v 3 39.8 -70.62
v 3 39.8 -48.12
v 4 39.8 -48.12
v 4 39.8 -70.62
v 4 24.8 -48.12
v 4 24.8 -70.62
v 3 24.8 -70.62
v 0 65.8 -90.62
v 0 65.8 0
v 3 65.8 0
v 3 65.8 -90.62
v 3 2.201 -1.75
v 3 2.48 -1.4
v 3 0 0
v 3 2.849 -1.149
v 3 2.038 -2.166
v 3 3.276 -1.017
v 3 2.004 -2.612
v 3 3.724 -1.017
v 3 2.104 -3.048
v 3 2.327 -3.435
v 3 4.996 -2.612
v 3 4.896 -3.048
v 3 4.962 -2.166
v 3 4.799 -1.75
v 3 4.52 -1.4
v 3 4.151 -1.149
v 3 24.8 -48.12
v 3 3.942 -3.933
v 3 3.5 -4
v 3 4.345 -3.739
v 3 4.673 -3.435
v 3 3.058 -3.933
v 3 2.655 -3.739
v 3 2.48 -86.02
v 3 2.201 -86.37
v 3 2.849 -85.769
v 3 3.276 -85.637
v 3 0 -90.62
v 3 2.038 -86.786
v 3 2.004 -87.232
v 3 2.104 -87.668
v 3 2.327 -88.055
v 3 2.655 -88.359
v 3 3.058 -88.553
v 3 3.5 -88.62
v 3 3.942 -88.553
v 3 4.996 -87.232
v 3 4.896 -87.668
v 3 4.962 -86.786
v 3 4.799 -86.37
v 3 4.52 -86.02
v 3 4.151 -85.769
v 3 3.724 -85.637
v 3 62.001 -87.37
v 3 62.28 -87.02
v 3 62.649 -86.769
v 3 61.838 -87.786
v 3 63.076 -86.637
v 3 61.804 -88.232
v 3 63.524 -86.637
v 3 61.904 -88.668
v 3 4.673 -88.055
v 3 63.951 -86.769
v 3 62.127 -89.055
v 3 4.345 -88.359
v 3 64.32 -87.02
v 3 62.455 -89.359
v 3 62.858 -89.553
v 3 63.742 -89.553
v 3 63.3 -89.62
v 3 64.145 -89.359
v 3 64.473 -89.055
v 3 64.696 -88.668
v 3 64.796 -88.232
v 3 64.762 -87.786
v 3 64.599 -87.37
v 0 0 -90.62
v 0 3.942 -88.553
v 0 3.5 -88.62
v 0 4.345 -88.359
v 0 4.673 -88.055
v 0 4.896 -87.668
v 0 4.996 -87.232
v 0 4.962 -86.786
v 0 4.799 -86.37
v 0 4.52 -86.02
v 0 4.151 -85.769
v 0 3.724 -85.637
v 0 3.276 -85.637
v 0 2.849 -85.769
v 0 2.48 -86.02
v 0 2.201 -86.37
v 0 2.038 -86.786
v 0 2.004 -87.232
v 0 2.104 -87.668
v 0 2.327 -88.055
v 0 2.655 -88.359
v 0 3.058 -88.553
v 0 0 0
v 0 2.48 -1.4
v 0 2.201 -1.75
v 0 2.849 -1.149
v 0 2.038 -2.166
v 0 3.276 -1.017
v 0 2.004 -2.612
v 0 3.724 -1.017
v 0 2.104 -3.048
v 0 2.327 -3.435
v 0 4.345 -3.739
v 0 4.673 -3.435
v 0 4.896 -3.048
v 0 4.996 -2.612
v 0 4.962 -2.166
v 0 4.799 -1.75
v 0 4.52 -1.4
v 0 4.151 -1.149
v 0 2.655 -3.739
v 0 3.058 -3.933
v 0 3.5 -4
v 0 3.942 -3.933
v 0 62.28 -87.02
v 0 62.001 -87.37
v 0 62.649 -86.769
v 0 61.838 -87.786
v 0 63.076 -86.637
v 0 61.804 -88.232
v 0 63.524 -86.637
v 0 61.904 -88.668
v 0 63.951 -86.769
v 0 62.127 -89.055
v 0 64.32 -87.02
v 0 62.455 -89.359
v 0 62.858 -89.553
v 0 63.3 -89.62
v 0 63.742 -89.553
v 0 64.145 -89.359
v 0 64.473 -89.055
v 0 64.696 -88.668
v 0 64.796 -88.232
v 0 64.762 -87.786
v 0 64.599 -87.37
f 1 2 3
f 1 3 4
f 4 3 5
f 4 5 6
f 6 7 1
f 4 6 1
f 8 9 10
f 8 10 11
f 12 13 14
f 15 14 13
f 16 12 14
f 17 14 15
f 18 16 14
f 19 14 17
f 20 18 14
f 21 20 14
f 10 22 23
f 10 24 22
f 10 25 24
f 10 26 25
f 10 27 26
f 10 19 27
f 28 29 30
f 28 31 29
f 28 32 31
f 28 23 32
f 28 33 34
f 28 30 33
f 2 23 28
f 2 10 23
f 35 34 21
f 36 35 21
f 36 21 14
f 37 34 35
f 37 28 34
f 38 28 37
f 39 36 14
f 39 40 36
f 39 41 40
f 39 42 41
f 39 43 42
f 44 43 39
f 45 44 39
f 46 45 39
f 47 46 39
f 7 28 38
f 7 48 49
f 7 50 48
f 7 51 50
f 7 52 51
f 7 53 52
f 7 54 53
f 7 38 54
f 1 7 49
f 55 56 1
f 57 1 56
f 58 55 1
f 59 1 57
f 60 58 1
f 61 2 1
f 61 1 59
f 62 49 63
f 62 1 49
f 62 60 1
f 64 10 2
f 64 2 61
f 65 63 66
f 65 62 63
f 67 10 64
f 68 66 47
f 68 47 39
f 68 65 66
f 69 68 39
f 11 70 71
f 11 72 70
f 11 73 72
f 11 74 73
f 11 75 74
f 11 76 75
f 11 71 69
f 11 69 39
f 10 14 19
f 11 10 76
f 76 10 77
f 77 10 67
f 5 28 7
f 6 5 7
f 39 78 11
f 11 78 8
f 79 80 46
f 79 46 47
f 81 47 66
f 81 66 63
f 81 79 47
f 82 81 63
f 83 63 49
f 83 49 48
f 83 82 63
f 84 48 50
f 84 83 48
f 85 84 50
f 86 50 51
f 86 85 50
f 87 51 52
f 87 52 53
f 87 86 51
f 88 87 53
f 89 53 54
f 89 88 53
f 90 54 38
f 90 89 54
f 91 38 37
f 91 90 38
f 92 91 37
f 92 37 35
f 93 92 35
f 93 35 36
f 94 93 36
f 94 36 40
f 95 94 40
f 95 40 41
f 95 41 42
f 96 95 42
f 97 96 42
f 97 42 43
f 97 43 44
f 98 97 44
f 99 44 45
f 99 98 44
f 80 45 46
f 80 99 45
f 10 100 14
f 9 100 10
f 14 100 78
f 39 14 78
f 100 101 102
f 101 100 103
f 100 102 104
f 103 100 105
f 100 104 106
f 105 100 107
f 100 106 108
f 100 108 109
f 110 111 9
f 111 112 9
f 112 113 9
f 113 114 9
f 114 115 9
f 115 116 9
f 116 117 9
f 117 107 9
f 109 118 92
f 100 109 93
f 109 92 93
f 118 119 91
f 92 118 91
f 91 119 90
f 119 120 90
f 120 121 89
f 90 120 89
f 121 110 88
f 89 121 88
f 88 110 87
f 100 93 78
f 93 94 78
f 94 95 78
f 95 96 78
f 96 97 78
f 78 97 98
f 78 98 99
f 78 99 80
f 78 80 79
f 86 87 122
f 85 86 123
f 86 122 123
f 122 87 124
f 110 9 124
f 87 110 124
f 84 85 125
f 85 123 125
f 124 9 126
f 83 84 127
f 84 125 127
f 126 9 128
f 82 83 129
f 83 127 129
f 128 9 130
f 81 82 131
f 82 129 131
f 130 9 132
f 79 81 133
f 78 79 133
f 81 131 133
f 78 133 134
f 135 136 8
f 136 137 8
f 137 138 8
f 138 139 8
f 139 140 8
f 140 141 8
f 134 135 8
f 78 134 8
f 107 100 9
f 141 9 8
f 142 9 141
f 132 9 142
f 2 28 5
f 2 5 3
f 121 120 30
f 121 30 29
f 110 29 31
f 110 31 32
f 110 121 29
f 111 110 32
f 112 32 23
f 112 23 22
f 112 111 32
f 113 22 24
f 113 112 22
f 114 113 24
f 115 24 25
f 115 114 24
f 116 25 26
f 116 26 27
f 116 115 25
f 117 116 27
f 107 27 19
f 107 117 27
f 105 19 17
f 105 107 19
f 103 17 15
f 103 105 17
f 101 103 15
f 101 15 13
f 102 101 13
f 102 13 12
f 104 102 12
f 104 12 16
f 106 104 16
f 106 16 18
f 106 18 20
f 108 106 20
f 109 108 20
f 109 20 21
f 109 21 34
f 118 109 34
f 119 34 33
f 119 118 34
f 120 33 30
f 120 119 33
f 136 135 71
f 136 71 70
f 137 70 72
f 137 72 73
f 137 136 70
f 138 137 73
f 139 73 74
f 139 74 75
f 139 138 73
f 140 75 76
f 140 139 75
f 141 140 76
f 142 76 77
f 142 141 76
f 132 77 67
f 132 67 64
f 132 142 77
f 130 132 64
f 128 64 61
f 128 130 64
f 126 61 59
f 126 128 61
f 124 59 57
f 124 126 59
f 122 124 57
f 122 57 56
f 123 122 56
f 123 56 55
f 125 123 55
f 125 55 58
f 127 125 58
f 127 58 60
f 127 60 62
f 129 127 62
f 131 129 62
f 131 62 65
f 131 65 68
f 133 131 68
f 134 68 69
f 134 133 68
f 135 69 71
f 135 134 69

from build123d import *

# Parameters (mm, degrees)
CROQUIS1_W              = 90.62
CROQUIS1_H              = 65.8
CROQUIS1_R              = 1.5
SALIENTE_EXTRUIR1_DEPTH = 3
CROQUIS2_W              = 22.5
CROQUIS2_H              = 15
SALIENTE_EXTRUIR2_DEPTH = 1


with BuildPart() as part:
    # Croquis1 → Saliente-Extruir1 (new body)
    with BuildSketch(Plane(origin=(0, 0, 0), x_dir=(0, 0, -1), z_dir=(1, 0, 0))):
        with Locations((45.31, 32.9)):
            Rectangle(CROQUIS1_W, CROQUIS1_H)
        with Locations((88.12, 63.3)):
            Circle(CROQUIS1_R, mode=Mode.SUBTRACT)
        with Locations((87.12, 3.5)):
            Circle(CROQUIS1_R, mode=Mode.SUBTRACT)
        with Locations((2.5, 3.5)):
            Circle(CROQUIS1_R, mode=Mode.SUBTRACT)
    extrude(amount=SALIENTE_EXTRUIR1_DEPTH)

    # Croquis2 → Saliente-Extruir2 (add)
    with BuildSketch(Plane(origin=(3, 0, 0), x_dir=(0, 0, -1), z_dir=(1, 0, 0))):
        with Locations((59.37, 32.3)):
            Rectangle(CROQUIS2_W, CROQUIS2_H)
    extrude(amount=SALIENTE_EXTRUIR2_DEPTH)


solid = part.part
